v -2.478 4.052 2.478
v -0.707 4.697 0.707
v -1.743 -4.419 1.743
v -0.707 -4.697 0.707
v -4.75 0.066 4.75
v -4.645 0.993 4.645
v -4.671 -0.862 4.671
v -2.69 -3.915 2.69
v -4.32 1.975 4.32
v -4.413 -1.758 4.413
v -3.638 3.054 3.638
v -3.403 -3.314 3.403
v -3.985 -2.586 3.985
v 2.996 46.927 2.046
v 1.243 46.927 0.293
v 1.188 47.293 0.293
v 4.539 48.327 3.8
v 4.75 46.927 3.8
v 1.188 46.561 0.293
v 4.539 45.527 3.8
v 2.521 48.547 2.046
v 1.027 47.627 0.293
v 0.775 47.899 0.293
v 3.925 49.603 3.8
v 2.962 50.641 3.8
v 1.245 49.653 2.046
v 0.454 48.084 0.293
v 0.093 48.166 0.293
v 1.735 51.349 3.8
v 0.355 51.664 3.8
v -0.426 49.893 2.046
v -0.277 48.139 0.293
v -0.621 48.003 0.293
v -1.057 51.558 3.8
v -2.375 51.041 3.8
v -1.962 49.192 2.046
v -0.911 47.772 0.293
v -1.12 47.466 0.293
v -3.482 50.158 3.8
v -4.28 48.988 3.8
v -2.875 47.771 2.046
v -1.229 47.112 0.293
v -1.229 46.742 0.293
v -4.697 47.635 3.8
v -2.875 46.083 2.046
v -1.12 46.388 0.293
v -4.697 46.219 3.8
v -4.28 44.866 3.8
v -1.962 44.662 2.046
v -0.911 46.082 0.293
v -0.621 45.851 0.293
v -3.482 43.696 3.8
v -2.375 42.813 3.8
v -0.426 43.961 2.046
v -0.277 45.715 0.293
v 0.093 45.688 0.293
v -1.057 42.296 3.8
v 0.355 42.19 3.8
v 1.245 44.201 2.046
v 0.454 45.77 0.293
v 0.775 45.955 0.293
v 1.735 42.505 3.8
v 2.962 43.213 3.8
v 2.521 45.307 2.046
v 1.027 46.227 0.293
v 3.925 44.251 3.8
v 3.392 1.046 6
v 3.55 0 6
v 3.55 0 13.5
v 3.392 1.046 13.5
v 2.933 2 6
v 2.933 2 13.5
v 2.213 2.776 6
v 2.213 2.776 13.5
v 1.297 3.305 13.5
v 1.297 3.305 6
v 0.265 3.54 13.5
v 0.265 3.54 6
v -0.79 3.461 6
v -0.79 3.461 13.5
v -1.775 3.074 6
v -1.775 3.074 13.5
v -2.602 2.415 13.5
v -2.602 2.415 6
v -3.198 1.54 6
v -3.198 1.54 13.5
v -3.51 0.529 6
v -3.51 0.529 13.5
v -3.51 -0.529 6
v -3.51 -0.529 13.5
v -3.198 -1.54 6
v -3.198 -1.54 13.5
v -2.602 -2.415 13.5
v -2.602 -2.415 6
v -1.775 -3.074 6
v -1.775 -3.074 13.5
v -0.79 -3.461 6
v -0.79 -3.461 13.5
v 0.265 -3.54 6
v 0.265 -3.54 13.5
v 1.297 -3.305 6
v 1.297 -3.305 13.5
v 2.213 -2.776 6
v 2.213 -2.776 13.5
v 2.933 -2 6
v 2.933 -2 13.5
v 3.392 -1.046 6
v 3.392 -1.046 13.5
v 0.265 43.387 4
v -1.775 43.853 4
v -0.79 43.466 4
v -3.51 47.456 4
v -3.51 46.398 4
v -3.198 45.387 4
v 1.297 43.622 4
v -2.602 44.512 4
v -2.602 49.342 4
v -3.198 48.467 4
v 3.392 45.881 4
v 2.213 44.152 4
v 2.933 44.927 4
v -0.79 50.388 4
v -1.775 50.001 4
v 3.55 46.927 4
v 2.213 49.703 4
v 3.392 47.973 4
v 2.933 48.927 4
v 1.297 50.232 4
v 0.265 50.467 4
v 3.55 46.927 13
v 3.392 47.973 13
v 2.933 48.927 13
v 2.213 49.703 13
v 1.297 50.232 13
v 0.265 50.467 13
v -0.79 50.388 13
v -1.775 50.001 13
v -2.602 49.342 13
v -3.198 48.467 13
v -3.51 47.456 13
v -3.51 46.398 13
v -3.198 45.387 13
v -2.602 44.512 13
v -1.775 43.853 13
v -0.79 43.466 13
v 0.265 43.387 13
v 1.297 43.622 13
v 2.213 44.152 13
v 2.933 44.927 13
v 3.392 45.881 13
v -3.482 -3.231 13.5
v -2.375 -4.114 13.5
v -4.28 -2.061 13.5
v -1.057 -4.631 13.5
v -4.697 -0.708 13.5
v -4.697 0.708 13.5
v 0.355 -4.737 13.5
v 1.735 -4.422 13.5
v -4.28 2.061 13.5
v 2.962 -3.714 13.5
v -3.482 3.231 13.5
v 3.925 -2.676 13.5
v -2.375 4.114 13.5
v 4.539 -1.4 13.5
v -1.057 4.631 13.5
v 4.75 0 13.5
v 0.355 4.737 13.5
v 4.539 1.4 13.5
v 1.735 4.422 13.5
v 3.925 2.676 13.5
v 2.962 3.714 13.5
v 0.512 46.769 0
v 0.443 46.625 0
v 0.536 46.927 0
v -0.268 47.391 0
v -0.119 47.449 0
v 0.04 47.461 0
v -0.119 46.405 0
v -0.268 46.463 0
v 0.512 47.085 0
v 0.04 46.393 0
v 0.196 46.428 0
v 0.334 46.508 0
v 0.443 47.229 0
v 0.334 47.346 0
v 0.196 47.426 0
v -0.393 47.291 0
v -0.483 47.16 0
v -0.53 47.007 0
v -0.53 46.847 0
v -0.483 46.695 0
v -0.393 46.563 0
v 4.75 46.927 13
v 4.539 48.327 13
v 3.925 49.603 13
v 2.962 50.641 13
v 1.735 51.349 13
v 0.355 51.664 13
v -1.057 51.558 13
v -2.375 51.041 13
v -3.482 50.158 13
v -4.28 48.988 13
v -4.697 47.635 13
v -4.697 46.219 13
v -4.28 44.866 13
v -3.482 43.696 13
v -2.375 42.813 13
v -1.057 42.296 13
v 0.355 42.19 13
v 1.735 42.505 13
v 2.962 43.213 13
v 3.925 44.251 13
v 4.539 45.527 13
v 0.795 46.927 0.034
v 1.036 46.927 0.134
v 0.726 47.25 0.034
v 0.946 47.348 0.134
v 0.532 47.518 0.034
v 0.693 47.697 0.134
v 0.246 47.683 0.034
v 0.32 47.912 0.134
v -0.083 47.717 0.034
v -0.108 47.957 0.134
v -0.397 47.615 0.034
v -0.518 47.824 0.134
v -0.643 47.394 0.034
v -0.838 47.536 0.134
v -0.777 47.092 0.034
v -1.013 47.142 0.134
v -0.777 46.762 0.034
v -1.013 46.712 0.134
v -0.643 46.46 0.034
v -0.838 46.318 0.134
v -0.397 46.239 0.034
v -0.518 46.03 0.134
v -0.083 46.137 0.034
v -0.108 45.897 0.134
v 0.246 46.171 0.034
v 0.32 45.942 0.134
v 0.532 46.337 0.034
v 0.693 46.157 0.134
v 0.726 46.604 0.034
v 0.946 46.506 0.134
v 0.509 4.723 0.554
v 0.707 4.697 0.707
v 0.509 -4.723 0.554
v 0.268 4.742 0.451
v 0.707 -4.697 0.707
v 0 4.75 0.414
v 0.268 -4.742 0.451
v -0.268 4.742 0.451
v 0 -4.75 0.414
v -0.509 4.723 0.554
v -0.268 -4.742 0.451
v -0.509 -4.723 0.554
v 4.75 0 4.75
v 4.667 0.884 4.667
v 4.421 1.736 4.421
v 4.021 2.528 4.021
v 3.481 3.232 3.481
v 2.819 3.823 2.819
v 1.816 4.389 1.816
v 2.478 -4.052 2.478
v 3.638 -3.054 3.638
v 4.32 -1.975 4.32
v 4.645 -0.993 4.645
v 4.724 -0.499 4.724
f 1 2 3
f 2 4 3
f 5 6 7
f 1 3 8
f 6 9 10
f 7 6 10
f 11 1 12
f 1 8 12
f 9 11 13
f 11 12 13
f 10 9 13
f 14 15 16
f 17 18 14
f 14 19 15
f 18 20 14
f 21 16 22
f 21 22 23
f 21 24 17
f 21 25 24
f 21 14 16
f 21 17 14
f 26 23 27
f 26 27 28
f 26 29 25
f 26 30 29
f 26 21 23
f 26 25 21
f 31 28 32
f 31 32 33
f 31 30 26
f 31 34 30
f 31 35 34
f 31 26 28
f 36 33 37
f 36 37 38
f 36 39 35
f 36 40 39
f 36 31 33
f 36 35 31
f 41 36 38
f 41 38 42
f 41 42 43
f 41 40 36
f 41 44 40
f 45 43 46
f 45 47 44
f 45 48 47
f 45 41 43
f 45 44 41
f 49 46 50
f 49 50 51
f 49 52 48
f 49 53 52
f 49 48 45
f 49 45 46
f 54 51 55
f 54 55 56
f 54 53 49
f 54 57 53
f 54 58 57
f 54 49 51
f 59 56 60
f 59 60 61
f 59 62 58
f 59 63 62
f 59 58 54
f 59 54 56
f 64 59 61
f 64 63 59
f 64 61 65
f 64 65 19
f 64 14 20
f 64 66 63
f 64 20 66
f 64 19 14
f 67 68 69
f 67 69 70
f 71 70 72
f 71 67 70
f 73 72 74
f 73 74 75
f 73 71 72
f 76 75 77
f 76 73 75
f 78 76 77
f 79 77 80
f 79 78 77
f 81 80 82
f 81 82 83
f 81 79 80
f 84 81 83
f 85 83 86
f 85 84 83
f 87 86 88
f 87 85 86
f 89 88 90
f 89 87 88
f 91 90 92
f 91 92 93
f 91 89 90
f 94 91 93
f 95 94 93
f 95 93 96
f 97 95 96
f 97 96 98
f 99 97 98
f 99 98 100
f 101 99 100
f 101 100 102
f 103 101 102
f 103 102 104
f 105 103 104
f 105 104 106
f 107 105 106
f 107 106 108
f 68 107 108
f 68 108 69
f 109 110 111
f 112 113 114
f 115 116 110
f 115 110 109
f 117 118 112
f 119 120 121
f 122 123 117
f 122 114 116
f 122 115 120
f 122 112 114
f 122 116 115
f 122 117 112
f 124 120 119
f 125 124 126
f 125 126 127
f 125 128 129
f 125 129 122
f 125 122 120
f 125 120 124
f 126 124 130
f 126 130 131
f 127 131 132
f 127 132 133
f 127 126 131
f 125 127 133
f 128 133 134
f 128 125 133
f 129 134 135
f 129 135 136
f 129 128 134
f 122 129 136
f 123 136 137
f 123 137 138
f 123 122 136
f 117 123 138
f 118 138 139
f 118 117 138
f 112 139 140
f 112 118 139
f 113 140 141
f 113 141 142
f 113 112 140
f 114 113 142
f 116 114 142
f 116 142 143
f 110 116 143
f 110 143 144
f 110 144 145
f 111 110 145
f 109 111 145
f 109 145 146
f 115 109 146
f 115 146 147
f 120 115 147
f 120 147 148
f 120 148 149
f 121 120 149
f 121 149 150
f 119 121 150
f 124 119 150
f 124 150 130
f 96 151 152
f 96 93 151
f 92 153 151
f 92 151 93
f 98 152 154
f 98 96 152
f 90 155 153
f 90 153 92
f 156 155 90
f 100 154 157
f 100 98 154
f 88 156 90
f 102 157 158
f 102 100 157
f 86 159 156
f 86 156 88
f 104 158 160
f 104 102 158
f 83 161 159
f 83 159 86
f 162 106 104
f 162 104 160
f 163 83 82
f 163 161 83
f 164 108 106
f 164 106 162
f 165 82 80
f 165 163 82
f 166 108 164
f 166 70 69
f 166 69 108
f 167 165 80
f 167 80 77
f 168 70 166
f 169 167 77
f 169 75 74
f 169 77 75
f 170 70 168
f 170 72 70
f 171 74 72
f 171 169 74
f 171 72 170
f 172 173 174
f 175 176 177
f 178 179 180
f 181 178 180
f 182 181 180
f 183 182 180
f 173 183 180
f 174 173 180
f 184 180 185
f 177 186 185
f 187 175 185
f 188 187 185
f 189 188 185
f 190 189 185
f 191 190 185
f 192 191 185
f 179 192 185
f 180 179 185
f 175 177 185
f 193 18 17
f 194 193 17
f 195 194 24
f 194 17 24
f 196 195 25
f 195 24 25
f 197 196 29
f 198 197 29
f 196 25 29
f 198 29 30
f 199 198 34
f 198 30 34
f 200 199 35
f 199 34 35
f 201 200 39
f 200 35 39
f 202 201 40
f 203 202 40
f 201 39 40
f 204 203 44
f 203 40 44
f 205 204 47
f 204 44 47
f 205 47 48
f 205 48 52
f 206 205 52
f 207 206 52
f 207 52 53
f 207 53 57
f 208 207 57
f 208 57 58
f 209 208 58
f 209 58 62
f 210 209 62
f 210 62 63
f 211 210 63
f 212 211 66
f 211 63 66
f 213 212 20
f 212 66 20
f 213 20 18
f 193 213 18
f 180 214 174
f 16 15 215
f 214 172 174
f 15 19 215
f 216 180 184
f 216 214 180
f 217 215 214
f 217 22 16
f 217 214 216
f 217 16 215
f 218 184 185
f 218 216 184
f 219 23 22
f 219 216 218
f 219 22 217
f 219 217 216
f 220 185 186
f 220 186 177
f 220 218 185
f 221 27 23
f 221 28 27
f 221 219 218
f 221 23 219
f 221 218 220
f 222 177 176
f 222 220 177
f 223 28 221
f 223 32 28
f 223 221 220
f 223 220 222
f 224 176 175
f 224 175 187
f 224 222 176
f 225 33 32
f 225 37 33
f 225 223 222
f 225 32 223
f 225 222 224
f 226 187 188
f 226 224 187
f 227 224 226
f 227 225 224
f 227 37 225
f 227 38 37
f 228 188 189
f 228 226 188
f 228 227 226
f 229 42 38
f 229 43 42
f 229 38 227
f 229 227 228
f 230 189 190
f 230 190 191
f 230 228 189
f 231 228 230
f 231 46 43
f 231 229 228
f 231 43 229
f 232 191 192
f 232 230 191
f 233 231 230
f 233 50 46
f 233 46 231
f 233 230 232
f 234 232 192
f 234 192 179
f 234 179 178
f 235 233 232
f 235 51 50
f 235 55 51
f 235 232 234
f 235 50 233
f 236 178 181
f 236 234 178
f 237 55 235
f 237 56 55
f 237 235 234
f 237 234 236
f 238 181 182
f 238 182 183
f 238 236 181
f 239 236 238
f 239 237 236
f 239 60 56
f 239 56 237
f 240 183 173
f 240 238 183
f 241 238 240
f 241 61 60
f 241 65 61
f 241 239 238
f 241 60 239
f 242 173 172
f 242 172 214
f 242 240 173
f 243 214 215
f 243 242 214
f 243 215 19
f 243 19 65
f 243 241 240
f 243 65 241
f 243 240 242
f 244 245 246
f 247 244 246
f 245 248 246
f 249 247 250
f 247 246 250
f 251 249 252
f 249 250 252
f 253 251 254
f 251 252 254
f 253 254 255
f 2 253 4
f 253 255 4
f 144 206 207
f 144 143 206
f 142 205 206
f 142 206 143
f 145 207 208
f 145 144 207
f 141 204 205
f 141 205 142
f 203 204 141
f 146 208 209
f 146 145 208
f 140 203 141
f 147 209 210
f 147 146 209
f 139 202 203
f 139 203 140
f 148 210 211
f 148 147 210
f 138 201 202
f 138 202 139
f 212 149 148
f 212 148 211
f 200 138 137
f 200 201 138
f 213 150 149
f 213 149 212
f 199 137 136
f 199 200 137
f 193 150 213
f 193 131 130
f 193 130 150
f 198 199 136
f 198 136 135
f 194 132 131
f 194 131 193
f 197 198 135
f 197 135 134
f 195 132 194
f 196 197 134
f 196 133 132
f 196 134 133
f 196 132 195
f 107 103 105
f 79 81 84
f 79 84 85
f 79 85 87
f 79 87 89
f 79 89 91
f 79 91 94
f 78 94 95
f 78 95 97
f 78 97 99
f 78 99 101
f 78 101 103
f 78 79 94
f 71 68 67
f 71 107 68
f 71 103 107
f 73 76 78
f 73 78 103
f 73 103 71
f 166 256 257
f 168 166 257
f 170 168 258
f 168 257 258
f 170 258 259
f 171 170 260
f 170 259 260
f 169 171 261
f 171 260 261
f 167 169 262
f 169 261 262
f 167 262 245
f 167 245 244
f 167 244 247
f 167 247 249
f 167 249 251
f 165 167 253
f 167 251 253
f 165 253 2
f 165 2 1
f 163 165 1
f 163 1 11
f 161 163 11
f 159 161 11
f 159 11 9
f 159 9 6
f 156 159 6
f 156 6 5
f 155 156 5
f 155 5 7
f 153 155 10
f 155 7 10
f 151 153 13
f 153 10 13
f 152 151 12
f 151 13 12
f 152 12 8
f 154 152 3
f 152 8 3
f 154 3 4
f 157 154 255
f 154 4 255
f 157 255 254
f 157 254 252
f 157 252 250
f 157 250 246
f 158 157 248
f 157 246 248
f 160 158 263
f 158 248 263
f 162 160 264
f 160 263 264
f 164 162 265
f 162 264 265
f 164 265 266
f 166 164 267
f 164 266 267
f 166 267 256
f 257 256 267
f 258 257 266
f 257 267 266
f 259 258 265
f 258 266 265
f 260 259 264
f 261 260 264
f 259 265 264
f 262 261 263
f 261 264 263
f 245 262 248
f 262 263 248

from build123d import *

# Parameters (mm, degrees)
F0_R     = 4.75
F0_R_2   = 3.55
F1_DEPTH = 13.5
F2_DEPTH = 6
F4_DEPTH = 12.5
F5_R     = 1
F6_R     = 4.75
F6_R_2   = 3.55
F7_DEPTH = 13
F8_DEPTH = 4
F9_SIZE  = 3.8
F10_R    = 1


with BuildPart() as f1:
    # F0 (on Top) → F1 (new body)
    with BuildSketch(Plane.XY):
        Circle(F0_R)
        Circle(F0_R_2, mode=Mode.SUBTRACT)
    extrude(amount=F1_DEPTH)

    # F0 (on Top) → F2 (join)
    with BuildSketch(Plane.XY):
        Circle(F0_R_2)
    extrude(amount=F2_DEPTH)

    # F3 (on Front) → F4 (cut, symmetric)
    with BuildSketch(Plane.XZ):
        Polygon((6.5688796352, 6.5688796352), (0, 0), (-5.8159730633, 5.8159730633), (-5.8159730633, -4.7987228955), (6.5688796352, -4.7987228955), align=None)
    extrude(amount=F4_DEPTH, both=True, mode=Mode.SUBTRACT)

    # F5
    f5_edges = [f1.edges().sort_by_distance(p)[0] for p in [
        (0, 0, 0),
    ]]
    fillet(f5_edges, radius=F5_R)


with BuildPart() as f7:
    # F6 (on Top) → F7 (new body)
    with BuildSketch(Plane.XY):
        with Locations((0, 46.9270383857)):
            Circle(F6_R)
        with Locations((0, 46.9270383857)):
            Circle(F6_R_2, mode=Mode.SUBTRACT)
    extrude(amount=F7_DEPTH)

    # F6 (on Top) → F8 (join)
    with BuildSketch(Plane.XY):
        with Locations((0, 46.9270383857)):
            Circle(F6_R_2)
    extrude(amount=F8_DEPTH)

    # F9
    f9_edges = [f7.edges().sort_by_distance(p)[0] for p in [
        (-4.75, 46.927038, 0),
    ]]
    chamfer(f9_edges, length=F9_SIZE)

    # F10
    f10_edges = [f7.edges().sort_by_distance(p)[0] for p in [
        (-0.95, 46.927038, 0),
    ]]
    fillet(f10_edges, radius=F10_R)


solid = Compound([f1.part, f7.part])
